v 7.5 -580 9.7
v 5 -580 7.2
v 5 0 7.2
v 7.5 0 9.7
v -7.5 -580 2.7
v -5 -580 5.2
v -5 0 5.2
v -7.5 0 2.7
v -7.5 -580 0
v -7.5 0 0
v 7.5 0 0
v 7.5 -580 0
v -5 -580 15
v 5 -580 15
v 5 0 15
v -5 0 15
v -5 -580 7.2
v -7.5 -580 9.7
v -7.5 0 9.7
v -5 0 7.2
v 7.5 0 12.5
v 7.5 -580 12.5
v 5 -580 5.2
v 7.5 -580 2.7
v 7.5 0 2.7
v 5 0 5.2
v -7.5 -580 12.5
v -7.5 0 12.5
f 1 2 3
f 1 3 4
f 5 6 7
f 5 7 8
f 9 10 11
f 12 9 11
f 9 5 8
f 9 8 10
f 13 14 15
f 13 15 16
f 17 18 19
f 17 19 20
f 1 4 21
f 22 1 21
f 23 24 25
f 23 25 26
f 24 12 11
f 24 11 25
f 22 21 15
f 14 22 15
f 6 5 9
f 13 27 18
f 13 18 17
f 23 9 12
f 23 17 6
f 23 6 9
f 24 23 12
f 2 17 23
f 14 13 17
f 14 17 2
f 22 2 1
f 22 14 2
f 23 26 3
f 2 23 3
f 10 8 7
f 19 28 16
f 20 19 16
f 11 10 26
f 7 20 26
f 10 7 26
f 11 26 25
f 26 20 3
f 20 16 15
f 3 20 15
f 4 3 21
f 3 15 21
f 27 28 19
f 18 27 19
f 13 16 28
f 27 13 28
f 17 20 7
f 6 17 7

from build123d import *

# Parameters (mm, degrees)
PAD_DEPTH = 580


with BuildPart() as part:
    # Sketch → Pad (new body)
    with BuildSketch(Plane.XZ):
        Polygon((-7.5, 0), (7.5, 0), (7.5, 2.7), (5, 5.2), (5, 7.2), (7.5, 9.7), (7.5, 12.5), (5, 15), (-5, 15), (-7.5, 12.5), (-7.5, 9.7), (-5, 7.2), (-5, 5.2), (-7.5, 2.7), align=None)
    extrude(amount=PAD_DEPTH)


solid = part.part
